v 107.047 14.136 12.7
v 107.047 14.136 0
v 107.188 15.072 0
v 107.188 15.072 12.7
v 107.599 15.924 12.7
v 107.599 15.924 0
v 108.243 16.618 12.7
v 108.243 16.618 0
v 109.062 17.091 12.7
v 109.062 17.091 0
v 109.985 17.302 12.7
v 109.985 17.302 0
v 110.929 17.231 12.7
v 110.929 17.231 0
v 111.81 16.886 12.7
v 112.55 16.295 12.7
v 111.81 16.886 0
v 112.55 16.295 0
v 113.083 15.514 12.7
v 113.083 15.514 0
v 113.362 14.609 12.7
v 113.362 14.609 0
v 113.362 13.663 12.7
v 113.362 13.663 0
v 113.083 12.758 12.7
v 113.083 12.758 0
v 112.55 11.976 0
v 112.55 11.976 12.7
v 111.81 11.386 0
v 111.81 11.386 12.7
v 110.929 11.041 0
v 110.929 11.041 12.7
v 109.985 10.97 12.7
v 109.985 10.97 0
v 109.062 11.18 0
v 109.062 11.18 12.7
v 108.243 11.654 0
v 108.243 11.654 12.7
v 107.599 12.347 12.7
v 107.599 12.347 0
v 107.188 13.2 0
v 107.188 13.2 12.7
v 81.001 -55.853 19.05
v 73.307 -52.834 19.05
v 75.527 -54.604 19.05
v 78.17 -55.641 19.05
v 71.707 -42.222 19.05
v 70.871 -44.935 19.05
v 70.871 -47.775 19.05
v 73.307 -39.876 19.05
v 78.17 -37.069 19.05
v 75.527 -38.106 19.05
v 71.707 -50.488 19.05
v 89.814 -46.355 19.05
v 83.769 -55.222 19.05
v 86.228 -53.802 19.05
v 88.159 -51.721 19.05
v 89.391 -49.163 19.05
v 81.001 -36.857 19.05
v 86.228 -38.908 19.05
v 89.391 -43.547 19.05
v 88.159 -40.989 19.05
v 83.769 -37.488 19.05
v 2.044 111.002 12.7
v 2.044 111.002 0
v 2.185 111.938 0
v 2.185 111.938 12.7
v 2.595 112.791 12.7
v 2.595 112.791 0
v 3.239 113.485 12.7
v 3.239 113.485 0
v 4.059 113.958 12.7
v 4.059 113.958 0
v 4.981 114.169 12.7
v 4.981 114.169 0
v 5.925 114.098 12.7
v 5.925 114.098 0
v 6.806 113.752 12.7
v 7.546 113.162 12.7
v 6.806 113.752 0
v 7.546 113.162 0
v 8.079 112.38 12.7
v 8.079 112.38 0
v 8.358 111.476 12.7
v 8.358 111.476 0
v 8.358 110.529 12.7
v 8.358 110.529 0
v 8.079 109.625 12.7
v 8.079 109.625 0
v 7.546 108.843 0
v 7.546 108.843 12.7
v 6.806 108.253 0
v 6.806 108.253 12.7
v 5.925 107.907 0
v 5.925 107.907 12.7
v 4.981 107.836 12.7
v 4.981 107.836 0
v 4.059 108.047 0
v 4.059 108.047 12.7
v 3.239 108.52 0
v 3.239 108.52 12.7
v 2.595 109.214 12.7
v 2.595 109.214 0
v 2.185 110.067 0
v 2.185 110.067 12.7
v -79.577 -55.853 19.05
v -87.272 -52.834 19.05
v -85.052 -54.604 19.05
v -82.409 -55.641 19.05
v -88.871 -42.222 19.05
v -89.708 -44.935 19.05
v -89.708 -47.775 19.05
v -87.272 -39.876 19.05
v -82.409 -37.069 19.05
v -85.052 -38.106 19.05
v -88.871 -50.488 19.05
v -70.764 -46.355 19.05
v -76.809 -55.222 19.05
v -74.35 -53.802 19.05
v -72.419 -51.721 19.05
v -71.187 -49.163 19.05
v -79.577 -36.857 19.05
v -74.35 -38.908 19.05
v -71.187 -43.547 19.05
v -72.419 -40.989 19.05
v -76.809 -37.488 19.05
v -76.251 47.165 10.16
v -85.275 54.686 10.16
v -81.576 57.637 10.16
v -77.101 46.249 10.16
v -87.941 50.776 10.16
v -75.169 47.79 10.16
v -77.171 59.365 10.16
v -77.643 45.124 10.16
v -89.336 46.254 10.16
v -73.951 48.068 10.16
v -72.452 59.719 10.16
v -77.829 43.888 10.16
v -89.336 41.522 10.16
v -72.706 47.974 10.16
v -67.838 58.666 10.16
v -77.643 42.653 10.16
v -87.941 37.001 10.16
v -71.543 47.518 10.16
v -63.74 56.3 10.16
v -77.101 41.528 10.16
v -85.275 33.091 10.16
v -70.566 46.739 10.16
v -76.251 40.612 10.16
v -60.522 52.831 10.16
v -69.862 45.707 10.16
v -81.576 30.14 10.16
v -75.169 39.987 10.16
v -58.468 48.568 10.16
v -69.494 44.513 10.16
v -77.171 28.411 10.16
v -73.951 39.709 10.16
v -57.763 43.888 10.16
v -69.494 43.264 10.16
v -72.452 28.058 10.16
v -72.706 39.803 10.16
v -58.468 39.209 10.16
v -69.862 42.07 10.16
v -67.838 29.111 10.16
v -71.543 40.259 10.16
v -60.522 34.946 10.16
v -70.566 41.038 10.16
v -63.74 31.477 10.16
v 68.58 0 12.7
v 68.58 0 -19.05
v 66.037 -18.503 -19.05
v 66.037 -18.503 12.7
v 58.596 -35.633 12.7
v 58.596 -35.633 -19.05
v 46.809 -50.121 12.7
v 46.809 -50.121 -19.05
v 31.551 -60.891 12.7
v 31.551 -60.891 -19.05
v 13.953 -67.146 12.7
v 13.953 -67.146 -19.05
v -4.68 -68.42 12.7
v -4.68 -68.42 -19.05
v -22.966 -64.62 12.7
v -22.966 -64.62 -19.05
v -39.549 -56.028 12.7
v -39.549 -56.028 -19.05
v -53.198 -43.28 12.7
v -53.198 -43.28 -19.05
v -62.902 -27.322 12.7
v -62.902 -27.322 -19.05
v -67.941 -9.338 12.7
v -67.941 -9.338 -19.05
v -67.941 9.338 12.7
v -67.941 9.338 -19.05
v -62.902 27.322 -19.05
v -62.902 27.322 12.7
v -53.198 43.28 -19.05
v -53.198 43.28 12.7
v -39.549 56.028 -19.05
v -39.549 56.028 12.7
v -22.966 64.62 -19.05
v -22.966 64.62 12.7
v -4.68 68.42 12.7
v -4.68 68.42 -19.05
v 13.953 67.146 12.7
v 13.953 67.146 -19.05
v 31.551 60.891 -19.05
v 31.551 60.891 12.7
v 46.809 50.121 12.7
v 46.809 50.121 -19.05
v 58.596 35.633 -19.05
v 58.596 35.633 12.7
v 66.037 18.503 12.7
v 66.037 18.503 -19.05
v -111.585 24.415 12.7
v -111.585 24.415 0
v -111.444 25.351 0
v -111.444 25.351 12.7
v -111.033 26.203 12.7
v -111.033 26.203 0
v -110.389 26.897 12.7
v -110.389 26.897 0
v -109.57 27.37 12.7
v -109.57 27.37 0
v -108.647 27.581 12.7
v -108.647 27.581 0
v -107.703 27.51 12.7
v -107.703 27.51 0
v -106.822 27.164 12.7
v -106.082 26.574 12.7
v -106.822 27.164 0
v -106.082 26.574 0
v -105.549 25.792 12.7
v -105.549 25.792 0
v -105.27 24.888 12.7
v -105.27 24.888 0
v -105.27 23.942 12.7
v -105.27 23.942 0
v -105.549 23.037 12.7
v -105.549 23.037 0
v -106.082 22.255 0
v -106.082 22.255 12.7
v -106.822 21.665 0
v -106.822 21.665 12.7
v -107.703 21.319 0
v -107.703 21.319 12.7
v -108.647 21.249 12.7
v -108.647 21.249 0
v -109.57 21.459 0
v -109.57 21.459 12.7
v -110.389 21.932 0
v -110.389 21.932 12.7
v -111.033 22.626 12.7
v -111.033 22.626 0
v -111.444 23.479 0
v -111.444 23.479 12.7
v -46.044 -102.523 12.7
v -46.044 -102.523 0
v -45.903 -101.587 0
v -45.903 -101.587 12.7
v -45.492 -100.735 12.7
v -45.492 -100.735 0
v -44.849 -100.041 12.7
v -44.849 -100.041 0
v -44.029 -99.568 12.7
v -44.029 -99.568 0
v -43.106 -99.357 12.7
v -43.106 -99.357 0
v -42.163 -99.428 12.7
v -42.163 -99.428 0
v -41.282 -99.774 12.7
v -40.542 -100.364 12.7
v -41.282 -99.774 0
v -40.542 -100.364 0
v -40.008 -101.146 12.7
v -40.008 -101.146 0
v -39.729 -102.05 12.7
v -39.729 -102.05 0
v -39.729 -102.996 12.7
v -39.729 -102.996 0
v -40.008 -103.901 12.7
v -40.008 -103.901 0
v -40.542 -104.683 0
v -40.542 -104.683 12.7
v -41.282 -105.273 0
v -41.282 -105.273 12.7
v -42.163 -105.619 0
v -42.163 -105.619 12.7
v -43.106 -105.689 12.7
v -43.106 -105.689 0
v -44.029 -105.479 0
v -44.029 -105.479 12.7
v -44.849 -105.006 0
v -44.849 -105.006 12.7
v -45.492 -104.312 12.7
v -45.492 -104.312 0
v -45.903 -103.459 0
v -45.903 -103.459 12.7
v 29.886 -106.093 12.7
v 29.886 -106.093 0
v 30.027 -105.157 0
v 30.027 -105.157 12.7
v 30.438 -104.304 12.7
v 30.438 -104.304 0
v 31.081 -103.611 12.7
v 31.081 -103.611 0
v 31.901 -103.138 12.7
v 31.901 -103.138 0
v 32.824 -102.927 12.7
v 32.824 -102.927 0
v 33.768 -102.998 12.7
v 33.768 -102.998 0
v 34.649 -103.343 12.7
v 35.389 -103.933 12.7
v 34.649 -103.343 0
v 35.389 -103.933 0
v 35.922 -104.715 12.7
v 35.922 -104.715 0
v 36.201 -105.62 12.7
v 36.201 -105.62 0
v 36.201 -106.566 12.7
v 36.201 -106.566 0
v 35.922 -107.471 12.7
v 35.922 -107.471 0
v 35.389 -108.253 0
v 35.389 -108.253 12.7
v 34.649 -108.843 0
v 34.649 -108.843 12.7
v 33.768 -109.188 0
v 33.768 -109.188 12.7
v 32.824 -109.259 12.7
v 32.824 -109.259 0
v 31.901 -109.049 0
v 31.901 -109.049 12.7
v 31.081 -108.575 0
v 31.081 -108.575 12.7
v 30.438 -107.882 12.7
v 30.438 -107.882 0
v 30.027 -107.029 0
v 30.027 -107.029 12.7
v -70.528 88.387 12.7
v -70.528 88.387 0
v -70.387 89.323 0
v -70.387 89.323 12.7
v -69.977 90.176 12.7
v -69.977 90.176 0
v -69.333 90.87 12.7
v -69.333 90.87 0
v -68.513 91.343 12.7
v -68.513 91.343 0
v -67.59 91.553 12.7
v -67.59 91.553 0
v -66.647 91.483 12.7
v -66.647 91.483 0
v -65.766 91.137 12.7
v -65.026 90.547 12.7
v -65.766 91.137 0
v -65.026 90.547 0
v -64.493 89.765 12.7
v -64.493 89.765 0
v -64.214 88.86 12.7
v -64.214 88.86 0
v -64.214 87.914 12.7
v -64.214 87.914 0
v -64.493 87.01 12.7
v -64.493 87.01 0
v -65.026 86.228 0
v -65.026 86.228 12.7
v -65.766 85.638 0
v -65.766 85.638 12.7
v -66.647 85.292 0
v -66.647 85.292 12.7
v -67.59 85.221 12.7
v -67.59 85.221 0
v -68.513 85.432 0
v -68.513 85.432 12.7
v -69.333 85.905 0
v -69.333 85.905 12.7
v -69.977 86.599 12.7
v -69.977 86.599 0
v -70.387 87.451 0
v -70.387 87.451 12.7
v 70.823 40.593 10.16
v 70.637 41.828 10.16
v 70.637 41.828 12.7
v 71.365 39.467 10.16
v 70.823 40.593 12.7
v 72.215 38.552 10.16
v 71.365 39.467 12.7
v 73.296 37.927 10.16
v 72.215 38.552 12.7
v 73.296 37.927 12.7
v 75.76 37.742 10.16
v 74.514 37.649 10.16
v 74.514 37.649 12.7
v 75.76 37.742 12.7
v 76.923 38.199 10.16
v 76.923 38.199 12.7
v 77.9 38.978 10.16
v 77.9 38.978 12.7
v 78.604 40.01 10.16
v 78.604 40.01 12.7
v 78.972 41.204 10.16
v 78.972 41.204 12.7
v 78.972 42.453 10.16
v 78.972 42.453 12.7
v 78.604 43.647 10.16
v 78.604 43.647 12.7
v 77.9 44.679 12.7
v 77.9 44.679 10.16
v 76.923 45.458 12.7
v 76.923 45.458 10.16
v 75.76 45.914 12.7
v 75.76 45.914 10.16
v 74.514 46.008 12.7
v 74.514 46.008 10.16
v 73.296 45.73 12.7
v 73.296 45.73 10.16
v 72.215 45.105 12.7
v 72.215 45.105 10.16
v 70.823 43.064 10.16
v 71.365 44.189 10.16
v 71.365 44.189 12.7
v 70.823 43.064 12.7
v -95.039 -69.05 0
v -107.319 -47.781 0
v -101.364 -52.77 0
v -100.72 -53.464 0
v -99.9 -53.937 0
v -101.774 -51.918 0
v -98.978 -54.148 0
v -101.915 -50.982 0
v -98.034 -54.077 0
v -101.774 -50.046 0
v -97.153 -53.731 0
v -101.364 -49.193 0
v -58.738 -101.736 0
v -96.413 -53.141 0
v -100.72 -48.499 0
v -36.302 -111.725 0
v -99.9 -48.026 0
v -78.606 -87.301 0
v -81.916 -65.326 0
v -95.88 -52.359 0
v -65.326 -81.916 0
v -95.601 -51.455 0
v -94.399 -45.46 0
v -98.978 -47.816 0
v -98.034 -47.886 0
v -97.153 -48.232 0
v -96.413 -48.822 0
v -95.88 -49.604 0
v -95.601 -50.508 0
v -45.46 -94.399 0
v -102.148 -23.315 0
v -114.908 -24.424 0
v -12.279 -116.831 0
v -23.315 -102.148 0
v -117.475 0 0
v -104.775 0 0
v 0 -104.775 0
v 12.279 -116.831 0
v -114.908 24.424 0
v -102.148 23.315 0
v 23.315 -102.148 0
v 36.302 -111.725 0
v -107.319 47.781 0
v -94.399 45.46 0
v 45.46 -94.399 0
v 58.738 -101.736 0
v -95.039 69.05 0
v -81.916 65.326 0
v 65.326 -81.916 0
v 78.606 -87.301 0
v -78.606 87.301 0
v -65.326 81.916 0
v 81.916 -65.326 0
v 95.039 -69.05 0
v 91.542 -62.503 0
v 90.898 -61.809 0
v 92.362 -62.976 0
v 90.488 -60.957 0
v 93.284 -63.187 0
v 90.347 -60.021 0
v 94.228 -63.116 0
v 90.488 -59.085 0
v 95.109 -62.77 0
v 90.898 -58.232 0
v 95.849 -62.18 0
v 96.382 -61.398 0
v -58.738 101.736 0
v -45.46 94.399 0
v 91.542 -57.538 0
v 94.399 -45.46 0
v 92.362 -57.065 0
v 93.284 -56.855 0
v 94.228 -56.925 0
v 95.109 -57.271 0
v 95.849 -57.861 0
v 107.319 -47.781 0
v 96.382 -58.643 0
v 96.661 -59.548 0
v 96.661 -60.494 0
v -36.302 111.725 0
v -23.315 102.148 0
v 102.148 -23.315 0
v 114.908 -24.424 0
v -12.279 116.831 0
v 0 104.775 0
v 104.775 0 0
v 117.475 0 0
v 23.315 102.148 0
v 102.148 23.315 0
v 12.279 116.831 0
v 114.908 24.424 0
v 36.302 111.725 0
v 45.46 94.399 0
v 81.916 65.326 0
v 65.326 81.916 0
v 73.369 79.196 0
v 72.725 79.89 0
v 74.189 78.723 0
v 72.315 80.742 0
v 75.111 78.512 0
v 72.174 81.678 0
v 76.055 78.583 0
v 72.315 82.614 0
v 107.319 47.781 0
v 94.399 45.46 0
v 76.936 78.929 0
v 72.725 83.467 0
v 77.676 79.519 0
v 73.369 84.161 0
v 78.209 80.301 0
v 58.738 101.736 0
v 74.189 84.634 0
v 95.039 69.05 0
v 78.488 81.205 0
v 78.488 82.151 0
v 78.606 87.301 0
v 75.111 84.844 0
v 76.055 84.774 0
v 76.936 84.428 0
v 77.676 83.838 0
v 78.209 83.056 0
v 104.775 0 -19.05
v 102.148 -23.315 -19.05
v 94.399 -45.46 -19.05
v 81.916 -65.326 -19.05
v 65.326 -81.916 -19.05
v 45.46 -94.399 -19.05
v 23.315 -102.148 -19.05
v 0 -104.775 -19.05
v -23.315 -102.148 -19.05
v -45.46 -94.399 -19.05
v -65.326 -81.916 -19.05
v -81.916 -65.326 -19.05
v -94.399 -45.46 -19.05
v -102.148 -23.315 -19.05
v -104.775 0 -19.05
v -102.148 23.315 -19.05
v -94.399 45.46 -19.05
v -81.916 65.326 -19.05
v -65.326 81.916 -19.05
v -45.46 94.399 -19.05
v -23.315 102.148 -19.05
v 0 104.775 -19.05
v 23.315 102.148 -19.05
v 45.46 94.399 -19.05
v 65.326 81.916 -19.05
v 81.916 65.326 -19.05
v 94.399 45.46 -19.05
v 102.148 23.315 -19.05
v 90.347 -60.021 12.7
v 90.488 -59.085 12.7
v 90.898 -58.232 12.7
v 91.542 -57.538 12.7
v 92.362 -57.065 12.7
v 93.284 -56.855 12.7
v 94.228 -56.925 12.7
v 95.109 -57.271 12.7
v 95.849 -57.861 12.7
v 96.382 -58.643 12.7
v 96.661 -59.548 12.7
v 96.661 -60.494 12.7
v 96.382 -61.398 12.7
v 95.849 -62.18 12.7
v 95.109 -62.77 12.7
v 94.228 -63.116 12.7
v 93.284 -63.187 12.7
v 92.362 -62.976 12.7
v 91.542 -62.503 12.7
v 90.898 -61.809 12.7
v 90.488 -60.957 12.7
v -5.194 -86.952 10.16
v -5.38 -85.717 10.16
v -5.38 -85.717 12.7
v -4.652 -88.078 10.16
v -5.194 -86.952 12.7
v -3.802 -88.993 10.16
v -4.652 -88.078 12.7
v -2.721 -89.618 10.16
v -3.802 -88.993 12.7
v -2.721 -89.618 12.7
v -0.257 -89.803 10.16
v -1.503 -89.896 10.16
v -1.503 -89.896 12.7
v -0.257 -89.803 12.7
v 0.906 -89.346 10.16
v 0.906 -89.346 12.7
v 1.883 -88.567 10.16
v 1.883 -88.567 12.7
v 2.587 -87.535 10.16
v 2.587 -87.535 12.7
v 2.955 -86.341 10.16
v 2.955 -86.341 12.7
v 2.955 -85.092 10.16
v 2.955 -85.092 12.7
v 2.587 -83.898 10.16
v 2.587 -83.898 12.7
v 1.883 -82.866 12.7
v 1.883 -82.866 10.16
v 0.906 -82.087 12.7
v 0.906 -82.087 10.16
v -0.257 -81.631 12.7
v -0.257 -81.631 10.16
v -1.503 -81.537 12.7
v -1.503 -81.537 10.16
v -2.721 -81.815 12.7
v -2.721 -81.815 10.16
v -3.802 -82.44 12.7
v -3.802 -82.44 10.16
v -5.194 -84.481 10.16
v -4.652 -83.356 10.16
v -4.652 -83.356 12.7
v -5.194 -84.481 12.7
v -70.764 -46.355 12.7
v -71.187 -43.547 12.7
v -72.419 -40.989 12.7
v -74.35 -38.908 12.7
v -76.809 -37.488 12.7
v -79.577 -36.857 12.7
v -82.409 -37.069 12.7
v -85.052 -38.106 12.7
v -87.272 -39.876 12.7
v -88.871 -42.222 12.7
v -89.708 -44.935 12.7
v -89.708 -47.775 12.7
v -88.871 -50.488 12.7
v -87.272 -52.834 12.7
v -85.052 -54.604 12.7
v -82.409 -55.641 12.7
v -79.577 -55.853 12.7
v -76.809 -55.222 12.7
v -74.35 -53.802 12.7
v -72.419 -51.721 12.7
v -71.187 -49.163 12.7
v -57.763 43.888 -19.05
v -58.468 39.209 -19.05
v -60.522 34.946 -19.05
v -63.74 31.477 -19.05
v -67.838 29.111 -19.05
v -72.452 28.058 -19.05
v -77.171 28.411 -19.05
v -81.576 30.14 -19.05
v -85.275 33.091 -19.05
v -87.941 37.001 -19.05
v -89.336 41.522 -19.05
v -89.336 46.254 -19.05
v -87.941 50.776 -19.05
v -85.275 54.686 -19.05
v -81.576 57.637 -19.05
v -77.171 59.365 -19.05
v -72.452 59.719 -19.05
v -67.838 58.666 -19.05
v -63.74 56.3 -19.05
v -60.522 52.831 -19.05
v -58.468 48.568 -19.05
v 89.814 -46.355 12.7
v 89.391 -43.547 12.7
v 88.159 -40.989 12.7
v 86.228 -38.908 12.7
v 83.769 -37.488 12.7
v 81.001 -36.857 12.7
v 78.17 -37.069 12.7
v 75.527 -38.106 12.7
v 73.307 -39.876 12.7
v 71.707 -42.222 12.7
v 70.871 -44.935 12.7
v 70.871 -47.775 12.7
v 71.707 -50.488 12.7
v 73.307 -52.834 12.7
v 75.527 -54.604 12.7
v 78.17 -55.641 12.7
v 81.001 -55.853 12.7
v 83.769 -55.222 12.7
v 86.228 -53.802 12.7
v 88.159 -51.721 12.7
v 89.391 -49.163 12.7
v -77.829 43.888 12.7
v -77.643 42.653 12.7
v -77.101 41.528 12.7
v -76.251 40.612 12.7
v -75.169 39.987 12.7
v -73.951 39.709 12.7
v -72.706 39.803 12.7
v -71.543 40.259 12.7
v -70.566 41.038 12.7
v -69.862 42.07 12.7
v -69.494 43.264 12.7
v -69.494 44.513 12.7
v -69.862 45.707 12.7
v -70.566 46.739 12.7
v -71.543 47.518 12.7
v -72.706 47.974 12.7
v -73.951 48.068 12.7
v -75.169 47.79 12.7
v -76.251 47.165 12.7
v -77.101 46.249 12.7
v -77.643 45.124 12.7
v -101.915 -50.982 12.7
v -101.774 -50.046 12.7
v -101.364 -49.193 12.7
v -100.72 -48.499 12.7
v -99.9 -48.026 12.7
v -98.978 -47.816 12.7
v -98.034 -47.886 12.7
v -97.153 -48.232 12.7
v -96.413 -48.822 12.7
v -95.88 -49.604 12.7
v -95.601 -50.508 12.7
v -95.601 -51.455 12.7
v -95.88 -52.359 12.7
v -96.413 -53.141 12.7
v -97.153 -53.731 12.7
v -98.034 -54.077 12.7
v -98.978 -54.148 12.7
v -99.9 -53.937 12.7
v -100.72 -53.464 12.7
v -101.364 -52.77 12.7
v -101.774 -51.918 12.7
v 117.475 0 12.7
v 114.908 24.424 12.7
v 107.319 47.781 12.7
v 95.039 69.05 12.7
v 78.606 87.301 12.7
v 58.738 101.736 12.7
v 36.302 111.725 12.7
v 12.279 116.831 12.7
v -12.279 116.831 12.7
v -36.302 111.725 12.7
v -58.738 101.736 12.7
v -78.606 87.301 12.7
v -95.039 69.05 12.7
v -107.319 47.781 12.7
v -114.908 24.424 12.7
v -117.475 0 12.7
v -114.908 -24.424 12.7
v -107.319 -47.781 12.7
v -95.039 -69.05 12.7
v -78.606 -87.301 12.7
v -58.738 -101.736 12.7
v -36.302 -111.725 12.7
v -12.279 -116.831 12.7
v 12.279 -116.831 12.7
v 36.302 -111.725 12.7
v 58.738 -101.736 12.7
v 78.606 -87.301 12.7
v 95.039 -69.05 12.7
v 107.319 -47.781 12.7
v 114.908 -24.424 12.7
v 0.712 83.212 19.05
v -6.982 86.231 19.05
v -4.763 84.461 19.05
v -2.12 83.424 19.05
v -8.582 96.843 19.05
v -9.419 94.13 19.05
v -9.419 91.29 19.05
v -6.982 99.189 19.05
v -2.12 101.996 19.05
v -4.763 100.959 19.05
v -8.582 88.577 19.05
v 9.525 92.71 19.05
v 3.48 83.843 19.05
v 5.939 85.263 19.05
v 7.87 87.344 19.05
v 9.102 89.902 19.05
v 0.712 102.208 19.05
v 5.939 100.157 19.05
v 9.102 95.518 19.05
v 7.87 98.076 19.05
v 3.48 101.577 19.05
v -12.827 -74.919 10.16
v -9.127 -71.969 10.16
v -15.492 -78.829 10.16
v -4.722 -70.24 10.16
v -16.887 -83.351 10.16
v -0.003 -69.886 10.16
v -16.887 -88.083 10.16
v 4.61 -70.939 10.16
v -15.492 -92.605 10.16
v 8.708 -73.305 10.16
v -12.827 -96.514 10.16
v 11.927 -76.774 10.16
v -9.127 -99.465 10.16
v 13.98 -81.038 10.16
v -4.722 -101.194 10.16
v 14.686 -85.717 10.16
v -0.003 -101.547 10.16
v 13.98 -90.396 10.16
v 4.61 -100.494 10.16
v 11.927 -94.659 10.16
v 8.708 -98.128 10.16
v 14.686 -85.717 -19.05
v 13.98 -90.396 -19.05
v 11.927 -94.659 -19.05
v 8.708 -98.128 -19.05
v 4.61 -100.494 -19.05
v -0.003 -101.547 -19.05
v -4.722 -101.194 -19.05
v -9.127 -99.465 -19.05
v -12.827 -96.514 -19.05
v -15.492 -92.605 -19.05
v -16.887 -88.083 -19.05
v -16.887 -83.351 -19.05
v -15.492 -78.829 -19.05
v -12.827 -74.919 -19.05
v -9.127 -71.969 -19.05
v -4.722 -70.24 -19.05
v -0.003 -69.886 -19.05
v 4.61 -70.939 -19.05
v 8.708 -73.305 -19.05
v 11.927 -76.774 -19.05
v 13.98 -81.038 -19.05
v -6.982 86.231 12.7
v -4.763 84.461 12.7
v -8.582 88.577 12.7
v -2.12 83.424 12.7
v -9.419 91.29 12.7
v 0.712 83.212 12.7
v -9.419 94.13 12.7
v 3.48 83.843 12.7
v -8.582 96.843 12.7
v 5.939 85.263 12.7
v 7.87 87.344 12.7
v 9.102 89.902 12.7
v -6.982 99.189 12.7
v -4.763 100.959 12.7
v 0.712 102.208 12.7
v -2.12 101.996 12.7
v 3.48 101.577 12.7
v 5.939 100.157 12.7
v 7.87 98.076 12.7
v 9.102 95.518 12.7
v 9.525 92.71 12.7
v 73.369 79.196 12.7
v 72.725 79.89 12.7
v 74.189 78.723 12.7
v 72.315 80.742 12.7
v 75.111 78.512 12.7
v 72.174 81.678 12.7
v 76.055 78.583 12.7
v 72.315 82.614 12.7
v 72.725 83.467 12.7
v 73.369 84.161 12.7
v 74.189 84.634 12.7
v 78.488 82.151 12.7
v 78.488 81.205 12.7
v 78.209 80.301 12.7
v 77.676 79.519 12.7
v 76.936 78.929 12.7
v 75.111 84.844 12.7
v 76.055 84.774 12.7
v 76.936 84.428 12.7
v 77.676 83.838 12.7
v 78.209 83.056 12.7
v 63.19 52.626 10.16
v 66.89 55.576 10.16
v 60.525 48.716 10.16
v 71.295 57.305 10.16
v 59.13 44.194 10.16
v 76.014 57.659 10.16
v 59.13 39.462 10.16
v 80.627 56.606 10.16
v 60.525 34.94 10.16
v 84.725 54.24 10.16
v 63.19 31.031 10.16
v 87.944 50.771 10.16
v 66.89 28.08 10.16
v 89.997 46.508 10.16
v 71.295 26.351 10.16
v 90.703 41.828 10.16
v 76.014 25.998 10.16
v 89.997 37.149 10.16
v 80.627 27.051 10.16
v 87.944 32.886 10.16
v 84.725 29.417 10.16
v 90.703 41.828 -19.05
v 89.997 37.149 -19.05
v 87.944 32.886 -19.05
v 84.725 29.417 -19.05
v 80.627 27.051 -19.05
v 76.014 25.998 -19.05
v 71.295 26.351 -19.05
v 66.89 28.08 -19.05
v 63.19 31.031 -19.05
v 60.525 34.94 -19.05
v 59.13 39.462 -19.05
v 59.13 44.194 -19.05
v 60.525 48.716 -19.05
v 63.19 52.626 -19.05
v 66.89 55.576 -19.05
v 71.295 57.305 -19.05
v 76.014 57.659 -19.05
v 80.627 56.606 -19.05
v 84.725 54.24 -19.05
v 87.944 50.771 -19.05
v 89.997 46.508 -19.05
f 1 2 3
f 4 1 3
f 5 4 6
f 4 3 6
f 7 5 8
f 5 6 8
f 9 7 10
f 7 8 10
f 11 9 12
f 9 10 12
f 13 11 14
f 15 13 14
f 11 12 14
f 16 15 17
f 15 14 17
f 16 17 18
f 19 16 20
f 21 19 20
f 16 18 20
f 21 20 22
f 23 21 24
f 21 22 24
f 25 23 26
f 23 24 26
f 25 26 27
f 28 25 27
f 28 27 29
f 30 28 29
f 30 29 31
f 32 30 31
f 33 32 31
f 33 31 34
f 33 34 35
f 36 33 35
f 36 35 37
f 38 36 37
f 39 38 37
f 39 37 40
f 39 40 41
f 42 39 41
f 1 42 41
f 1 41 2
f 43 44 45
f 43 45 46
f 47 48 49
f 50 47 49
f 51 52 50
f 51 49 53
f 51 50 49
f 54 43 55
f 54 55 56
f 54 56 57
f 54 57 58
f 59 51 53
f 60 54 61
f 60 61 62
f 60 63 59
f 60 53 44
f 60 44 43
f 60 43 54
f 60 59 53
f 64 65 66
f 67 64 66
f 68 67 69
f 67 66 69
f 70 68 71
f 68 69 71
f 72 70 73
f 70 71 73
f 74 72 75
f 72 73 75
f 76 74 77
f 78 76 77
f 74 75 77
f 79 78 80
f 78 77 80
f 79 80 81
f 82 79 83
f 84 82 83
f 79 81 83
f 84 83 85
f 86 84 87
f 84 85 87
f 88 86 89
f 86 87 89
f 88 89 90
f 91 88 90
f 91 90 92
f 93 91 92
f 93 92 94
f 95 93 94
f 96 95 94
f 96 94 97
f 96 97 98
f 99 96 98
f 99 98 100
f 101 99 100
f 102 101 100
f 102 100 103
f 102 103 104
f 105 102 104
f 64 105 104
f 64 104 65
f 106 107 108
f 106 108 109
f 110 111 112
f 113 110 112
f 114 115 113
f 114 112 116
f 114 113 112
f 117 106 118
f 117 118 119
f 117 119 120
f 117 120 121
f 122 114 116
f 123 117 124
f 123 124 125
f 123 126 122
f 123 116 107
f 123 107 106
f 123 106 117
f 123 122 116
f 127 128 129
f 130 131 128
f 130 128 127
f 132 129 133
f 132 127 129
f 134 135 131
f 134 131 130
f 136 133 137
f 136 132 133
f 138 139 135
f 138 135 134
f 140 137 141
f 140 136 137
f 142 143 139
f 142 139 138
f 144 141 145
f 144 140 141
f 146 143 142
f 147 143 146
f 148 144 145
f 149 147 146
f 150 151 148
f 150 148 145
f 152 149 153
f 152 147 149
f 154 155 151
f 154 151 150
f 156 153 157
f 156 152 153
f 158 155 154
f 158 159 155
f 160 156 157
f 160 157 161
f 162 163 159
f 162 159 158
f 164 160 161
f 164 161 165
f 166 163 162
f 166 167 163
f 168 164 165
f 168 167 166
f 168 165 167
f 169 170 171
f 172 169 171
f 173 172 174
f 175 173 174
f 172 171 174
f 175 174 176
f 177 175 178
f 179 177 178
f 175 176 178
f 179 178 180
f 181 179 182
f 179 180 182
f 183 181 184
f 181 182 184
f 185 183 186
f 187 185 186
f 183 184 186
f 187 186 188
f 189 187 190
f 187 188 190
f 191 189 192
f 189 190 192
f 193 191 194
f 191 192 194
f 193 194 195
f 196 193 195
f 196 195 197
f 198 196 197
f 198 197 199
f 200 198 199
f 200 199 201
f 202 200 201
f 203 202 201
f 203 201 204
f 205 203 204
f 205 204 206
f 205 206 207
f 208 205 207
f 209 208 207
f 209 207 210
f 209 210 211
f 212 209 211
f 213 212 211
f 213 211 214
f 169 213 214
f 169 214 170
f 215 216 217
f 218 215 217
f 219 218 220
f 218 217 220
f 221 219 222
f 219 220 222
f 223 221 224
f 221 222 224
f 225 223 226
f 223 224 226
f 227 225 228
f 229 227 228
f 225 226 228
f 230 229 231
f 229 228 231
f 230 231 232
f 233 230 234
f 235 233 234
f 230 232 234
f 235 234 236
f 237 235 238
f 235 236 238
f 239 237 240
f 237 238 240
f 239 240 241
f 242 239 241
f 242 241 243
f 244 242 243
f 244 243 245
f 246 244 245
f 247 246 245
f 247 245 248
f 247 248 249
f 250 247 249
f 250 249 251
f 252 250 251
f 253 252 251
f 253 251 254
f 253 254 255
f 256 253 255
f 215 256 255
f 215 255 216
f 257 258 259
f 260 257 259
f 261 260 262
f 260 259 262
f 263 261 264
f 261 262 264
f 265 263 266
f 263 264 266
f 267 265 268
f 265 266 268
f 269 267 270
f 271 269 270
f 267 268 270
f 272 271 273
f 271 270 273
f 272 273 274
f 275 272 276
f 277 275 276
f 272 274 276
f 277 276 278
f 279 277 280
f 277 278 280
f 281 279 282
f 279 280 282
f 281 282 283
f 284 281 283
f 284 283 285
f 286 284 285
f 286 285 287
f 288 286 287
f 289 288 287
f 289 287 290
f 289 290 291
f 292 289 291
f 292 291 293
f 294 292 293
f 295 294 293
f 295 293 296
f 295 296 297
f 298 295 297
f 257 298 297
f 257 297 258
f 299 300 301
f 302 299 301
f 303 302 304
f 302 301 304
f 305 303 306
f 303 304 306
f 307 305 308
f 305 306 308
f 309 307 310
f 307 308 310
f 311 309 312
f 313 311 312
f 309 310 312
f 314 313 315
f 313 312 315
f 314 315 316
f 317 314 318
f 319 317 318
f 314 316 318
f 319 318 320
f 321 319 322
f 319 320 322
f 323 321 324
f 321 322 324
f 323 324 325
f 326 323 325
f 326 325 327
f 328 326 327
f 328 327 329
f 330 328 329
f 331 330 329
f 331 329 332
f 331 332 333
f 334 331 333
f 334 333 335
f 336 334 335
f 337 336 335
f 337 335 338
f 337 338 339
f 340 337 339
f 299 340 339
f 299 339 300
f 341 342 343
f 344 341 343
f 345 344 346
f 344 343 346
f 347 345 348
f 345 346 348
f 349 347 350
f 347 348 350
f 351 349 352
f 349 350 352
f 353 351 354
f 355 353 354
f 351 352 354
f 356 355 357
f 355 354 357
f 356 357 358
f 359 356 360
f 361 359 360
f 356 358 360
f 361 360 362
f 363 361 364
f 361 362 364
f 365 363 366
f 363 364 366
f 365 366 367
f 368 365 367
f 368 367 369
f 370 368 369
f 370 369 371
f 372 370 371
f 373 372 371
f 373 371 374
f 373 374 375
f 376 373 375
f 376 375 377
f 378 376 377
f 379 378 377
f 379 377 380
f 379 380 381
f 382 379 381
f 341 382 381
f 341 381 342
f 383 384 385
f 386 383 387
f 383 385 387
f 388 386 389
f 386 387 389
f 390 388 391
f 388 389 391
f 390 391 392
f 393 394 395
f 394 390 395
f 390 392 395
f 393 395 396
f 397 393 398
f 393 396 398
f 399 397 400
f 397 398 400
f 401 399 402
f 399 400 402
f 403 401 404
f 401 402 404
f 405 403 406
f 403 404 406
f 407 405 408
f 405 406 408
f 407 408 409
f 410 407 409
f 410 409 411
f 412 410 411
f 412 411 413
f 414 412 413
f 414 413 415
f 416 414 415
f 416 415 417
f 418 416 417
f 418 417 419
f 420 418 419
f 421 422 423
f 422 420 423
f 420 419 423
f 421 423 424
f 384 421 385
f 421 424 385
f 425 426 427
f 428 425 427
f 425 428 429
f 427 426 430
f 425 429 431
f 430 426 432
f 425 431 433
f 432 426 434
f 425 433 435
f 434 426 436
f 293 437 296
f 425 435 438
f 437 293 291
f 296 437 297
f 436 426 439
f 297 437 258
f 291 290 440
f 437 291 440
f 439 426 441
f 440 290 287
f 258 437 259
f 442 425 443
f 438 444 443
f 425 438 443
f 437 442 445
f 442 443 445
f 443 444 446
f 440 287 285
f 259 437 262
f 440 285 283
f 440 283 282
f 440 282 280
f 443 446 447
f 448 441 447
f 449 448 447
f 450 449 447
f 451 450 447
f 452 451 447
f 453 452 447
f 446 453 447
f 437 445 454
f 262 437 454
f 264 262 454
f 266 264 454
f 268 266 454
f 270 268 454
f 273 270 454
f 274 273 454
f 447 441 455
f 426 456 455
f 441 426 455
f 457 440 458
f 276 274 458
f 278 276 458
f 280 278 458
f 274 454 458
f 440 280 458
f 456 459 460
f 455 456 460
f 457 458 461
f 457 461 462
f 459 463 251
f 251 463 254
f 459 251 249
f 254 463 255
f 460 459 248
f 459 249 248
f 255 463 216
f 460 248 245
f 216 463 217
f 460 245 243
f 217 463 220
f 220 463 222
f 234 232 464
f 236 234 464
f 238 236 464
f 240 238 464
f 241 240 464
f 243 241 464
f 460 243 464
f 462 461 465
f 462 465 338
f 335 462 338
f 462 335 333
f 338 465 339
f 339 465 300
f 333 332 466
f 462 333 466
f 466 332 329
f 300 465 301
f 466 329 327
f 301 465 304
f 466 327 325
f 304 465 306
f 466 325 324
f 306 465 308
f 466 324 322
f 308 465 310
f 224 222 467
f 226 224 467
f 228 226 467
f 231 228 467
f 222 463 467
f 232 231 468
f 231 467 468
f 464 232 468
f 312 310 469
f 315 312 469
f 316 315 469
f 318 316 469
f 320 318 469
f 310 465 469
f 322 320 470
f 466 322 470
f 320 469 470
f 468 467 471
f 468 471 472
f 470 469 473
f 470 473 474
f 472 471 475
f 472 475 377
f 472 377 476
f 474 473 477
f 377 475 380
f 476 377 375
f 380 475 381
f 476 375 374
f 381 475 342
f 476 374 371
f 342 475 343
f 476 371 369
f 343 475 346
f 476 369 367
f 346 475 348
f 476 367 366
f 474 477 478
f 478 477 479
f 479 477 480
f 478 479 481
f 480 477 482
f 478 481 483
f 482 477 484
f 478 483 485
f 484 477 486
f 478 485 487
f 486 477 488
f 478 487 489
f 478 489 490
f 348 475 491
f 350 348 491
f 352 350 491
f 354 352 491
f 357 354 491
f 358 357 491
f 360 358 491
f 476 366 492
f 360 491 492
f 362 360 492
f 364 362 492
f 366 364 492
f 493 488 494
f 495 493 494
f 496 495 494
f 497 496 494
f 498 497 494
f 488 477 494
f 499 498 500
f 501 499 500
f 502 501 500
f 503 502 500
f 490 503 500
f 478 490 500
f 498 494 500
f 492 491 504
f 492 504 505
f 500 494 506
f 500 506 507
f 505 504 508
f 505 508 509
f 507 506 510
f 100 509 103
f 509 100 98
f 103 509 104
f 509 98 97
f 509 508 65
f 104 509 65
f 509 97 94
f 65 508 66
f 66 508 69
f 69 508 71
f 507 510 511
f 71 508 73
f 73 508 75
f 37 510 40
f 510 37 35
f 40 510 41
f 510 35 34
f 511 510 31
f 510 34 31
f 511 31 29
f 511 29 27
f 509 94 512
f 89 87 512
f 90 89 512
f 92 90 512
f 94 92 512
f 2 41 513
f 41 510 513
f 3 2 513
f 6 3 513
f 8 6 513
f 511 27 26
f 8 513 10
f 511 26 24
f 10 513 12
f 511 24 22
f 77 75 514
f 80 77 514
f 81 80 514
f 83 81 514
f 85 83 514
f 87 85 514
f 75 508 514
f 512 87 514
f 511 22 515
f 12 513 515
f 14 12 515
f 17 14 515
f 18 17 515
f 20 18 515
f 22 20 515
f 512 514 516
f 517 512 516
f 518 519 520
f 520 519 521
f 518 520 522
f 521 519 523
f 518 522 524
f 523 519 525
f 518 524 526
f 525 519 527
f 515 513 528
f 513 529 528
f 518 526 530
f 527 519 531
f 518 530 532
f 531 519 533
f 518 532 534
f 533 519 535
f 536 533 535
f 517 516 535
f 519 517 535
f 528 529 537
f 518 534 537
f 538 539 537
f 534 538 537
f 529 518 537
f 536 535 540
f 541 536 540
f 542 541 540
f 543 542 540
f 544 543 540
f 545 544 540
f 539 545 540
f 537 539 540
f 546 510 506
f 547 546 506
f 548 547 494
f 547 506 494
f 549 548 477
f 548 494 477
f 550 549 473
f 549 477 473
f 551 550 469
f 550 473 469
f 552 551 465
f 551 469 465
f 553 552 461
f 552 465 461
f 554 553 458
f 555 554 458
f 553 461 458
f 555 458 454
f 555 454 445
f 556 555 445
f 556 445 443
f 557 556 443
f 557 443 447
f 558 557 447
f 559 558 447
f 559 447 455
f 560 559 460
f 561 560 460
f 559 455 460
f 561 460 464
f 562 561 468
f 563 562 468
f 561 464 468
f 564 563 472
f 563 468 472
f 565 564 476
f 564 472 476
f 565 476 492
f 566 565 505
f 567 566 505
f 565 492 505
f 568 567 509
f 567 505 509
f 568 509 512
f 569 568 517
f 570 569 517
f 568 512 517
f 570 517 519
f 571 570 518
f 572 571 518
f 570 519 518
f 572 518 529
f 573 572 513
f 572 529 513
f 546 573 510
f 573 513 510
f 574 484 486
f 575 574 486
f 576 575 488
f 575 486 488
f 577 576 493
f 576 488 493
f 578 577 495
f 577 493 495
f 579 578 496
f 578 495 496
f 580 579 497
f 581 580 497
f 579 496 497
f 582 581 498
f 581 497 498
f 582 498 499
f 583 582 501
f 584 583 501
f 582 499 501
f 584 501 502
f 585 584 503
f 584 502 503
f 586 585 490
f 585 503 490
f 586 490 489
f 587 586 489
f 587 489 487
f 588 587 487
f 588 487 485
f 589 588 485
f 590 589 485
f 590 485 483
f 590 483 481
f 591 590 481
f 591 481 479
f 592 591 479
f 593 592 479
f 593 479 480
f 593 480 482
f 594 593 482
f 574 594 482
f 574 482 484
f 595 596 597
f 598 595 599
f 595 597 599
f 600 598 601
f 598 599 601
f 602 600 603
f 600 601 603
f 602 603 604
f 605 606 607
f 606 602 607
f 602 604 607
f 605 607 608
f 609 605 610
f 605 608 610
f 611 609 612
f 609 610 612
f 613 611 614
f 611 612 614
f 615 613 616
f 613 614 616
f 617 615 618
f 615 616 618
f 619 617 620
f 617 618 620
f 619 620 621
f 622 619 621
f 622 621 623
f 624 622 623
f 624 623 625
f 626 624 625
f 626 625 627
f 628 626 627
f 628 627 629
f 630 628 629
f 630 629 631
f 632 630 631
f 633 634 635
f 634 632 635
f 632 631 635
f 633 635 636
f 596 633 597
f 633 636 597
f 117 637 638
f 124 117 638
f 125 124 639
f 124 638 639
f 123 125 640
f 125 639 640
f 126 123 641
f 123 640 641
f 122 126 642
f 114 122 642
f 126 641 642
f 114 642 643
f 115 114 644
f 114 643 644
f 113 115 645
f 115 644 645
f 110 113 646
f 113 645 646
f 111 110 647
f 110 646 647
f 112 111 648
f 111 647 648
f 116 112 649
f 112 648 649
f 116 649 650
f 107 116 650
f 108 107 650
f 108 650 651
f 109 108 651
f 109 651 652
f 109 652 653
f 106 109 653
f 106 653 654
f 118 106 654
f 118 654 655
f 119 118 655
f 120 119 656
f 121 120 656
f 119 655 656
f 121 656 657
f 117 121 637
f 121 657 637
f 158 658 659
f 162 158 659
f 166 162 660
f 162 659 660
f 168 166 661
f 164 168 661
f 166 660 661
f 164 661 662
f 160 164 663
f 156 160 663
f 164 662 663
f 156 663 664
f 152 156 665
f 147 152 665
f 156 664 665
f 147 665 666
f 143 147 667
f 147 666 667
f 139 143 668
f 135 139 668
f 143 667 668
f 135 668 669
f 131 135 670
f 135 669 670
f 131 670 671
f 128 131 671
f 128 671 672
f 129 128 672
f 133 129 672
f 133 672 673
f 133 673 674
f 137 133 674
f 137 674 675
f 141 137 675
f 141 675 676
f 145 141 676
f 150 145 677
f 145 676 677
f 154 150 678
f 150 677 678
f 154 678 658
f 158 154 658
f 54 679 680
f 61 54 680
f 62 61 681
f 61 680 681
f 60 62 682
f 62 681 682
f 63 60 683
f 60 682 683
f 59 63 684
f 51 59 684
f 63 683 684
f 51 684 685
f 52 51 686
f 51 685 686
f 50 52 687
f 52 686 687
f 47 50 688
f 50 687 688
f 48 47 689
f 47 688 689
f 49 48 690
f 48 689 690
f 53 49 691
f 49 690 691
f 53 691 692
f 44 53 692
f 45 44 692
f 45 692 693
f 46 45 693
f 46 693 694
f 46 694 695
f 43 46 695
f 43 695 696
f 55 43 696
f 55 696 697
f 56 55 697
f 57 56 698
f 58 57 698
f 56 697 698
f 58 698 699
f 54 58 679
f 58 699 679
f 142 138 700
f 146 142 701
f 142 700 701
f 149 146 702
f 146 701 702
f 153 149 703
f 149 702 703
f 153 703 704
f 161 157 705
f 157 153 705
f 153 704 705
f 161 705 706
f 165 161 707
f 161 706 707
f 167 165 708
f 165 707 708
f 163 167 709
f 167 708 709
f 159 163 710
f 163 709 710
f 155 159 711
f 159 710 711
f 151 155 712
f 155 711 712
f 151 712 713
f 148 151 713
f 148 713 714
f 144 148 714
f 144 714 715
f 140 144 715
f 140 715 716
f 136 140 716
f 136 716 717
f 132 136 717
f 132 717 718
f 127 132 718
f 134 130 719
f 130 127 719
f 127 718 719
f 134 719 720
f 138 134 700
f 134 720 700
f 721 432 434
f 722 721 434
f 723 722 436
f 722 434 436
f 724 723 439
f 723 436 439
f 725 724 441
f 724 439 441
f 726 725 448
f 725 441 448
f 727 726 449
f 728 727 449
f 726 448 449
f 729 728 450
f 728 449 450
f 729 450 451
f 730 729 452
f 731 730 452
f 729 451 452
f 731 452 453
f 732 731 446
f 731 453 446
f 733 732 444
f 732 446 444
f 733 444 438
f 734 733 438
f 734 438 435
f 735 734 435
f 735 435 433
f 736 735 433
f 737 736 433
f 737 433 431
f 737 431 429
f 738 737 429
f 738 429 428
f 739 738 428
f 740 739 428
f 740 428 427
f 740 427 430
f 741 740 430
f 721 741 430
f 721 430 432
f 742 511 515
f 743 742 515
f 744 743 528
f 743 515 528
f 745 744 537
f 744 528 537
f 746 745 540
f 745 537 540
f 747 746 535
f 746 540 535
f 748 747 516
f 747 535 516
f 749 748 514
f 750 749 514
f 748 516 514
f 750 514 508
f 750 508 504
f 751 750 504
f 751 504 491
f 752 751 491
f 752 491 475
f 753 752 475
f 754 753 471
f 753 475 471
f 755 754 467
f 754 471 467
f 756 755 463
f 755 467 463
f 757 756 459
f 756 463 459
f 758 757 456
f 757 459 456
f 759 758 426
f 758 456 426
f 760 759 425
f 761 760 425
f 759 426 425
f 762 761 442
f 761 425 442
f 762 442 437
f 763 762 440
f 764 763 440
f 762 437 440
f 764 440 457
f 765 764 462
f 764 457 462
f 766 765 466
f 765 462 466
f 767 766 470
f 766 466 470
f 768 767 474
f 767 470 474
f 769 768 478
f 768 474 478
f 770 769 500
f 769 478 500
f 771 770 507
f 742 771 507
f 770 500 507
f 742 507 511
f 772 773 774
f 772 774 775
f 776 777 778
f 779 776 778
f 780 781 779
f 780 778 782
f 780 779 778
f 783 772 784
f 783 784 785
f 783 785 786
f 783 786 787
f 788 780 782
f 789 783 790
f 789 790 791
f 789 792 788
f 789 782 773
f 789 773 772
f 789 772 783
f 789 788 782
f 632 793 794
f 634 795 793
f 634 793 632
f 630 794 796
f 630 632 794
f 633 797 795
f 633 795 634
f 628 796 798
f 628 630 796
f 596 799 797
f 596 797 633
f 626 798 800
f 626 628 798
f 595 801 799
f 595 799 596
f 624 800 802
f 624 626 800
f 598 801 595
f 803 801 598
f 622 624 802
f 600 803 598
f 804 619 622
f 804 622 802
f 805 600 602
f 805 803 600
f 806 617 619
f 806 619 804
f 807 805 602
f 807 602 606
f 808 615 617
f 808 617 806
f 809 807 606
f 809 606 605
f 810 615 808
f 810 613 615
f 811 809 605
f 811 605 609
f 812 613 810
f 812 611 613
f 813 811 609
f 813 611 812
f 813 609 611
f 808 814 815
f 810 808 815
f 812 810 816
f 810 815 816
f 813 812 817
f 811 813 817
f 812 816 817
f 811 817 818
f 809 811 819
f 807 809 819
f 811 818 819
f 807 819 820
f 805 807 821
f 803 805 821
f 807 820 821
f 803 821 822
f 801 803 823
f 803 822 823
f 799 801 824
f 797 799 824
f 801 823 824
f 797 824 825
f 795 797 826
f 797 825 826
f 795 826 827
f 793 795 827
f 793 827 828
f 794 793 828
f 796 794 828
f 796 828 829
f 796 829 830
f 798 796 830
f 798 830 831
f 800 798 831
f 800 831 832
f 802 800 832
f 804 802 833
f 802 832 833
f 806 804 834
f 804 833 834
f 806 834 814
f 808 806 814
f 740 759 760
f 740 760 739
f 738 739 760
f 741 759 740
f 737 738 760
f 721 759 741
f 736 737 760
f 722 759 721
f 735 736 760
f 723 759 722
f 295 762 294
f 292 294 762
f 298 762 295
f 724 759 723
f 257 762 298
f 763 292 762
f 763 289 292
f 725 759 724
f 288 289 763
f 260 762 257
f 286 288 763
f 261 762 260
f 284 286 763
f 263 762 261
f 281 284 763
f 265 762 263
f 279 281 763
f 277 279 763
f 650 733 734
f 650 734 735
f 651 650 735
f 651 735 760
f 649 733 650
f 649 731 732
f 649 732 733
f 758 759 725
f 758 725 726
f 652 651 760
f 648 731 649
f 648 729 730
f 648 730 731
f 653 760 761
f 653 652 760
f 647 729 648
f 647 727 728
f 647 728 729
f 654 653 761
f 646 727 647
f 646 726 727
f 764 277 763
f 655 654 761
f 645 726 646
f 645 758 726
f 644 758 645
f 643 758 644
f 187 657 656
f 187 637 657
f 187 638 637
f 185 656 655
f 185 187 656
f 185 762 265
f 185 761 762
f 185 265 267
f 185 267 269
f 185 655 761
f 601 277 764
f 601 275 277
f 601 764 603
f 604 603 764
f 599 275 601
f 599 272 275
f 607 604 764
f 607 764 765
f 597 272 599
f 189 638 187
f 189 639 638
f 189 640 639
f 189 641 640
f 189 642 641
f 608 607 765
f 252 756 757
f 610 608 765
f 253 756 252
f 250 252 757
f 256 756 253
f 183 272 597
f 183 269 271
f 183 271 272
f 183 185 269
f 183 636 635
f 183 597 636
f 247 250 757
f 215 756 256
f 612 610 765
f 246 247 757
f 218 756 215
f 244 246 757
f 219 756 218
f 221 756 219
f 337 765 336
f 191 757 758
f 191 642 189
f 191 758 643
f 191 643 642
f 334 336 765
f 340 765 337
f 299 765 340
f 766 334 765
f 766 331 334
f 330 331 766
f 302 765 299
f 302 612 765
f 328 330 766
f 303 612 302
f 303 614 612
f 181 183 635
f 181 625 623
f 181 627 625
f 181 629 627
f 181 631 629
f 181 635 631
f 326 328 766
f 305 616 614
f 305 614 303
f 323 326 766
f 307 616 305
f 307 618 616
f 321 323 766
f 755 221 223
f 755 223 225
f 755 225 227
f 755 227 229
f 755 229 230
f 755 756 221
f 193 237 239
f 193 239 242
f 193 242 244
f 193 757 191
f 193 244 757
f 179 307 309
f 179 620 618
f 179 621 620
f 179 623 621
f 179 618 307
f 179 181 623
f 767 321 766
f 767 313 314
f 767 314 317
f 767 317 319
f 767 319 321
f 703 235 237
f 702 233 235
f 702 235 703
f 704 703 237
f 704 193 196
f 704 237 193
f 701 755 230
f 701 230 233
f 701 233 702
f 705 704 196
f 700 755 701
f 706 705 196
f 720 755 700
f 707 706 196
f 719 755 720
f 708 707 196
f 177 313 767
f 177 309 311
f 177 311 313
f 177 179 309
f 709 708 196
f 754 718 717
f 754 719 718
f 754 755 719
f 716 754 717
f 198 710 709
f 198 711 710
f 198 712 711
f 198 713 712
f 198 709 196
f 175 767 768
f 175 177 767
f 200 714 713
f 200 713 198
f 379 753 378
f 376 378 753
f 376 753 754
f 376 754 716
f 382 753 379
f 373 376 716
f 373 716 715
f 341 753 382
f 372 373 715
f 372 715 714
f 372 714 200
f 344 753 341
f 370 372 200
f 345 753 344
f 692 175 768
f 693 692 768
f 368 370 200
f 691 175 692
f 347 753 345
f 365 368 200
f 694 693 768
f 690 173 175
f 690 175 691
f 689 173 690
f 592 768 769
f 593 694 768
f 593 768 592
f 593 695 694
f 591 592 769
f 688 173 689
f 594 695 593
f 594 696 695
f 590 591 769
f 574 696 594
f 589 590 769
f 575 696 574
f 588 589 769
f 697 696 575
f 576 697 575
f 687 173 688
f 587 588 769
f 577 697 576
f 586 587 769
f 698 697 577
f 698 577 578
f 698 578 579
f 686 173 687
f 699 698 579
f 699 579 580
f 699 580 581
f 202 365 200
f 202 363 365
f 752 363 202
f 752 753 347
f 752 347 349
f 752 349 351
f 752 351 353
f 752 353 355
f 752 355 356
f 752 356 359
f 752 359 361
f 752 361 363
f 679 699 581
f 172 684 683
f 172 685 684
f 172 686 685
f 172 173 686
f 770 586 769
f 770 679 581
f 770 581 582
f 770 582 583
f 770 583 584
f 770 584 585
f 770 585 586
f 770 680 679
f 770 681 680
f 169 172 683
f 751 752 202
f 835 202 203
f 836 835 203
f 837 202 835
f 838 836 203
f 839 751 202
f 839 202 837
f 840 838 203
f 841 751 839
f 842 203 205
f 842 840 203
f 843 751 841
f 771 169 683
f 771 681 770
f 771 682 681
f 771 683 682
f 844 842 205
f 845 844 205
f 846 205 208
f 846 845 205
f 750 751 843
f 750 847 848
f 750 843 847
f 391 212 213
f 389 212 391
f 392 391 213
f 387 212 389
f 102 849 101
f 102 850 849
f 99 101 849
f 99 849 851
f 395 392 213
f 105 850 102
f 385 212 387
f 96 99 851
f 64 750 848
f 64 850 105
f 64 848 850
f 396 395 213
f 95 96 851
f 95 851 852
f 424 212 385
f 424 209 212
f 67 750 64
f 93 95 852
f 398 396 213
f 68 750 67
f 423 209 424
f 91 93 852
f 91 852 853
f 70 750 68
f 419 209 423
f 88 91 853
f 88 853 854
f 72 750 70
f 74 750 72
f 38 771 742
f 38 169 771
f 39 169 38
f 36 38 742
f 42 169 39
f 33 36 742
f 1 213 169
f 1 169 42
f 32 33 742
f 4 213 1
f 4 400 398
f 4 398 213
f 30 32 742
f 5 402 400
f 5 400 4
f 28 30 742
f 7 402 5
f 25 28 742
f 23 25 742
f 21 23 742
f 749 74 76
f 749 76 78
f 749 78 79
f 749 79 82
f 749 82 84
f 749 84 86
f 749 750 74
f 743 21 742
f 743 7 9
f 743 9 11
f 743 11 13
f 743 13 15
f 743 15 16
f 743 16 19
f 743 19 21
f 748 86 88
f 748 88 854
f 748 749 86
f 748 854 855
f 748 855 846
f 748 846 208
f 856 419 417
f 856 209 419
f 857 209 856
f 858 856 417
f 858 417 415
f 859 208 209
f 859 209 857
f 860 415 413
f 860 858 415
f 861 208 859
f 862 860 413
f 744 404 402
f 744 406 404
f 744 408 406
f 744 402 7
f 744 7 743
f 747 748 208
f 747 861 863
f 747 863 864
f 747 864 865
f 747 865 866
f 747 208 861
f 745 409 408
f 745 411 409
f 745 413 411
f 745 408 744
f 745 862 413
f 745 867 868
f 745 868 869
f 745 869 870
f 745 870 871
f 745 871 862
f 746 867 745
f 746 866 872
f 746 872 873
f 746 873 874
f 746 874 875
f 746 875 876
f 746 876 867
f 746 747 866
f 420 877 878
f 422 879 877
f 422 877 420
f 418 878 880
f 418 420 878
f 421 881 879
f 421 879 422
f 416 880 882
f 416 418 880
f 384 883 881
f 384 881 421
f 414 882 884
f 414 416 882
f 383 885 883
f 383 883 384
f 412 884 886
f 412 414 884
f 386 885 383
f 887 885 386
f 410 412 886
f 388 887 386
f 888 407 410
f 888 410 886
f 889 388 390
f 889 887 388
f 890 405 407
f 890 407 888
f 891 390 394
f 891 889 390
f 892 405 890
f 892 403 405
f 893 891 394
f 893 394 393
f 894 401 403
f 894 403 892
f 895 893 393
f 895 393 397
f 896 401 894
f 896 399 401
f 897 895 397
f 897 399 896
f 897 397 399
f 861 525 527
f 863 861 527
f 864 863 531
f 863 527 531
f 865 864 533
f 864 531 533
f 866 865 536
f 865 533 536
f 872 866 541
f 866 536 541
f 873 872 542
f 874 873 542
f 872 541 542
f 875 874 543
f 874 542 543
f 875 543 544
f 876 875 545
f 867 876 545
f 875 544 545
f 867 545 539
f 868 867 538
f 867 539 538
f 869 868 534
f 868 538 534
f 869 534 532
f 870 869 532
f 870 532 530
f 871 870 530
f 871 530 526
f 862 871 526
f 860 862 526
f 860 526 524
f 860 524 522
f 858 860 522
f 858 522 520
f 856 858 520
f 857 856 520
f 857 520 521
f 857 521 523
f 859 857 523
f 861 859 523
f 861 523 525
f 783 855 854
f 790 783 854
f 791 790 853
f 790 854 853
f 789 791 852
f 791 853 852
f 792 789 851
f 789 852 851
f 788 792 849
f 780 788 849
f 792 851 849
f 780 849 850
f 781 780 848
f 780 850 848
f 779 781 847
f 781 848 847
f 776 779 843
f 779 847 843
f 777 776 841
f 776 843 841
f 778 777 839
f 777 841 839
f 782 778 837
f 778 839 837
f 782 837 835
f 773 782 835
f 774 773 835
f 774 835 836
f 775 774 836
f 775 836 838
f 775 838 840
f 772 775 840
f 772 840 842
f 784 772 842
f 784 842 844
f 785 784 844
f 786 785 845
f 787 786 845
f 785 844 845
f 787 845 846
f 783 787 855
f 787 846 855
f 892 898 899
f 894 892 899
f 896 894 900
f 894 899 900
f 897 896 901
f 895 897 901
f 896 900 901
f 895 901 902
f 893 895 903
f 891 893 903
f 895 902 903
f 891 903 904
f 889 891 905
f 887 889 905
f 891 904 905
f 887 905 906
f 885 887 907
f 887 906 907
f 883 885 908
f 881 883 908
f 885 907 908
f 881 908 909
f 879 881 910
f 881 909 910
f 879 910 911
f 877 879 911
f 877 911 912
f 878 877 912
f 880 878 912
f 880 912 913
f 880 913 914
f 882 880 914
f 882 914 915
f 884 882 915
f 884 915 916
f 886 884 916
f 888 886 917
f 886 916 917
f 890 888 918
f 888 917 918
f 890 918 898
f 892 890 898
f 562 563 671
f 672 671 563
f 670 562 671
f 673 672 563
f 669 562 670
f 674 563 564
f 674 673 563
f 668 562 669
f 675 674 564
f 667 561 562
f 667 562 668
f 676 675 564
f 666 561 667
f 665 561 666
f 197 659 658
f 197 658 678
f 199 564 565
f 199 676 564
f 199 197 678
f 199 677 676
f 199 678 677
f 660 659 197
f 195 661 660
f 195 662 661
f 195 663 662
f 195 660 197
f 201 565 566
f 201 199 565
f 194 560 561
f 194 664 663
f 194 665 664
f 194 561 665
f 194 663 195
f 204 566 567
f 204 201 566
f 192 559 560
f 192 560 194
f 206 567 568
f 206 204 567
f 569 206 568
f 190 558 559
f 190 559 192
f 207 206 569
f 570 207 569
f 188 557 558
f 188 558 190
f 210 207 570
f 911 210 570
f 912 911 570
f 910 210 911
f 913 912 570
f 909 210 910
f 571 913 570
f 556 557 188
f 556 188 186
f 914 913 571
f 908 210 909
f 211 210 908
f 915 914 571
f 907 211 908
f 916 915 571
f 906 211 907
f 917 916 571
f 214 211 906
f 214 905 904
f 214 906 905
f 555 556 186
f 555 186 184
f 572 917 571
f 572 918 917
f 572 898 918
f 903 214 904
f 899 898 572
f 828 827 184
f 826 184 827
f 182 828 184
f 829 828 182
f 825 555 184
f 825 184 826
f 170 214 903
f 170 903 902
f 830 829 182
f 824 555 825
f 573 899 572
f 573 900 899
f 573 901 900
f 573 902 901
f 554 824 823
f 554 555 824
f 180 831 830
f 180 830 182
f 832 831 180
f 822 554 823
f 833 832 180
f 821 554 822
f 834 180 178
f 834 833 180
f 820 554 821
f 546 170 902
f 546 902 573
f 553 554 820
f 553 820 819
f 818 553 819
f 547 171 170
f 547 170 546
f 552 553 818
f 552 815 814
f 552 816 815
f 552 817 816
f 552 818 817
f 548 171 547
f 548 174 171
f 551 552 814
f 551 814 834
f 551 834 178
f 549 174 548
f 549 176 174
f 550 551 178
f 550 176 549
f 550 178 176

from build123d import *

# Parameters (mm, degrees)
F0_R      = 117.475
F1_DEPTH  = 12.7
F2_R      = 104.775
F3_DEPTH  = 19.05
F6_D      = 6.35
F8_D      = 8.382
F9_R      = 15.875
F9_R_2    = 4.191
F10_DEPTH = 29.21
F11_R     = 68.58
F12_DEPTH = 31.751
F13_R     = 9.525
F14_DEPTH = 6.35


with BuildPart() as f1:
    # F0 (on Top) → F1 (new body)
    with BuildSketch(Plane.XY):
        Circle(F0_R)
    extrude(amount=F1_DEPTH)

    # F2 (on face) → F3 (join)
    with BuildSketch(Plane(origin=(0, 0, 0), x_dir=(1, 0, 0), z_dir=(0, 0, -1))):
        Circle(F2_R)
    extrude(amount=F3_DEPTH)

    # F6 (through all)
    with Locations(Plane.XY.offset(12.7)):
        with Locations((-108.409797, 24.41478), (-98.740241, -50.981668), (-42.869029, -102.523227), (33.061079, -106.093029), (93.52154, -60.020723), (110.222233, 14.135946), (75.348719, 81.678248), (-67.353204, 88.387281), (5.218701, 111.002391)):
            Hole(F6_D / 2)

    # F8 (through all)
    with Locations(Plane(origin=(0, 0, -19.05), x_dir=(1, 0, 0), z_dir=(0, 0, -1))):
        with Locations((74.827591, -41.828307), (-73.638172, -43.888441), (-1.189419, 85.716748)):
            Hole(F8_D / 2)

    # F9 (on face) → F10 (cut)
    with BuildSketch(Plane(origin=(0, 0, -19.05), x_dir=(1, 0, 0), z_dir=(0, 0, -1))):
        with Locations((-73.638172, -43.888441)):
            Circle(F9_R)
        with Locations((-73.638172, -43.888441)):
            Circle(F9_R_2, mode=Mode.SUBTRACT)
        with Locations((-1.189419, 85.716748)):
            Circle(F9_R)
        with Locations((-1.189419, 85.716748)):
            Circle(F9_R_2, mode=Mode.SUBTRACT)
        with Locations((74.827591, -41.828307)):
            Circle(F9_R)
        with Locations((74.827591, -41.828307)):
            Circle(F9_R_2, mode=Mode.SUBTRACT)
    extrude(amount=-F10_DEPTH, mode=Mode.SUBTRACT)

    # F11 (on face) → F12 (cut, through all)
    with BuildSketch(Plane(origin=(0, 0, -19.05), x_dir=(1, 0, 0), z_dir=(0, 0, -1))):
        Circle(F11_R)
    extrude(amount=-F12_DEPTH, mode=Mode.SUBTRACT)

    # F13 (on face) → F14 (join)
    with BuildSketch(Plane.XY.offset(12.7)):
        with Locations((0, 92.71)):
            Circle(F13_R)
        with Locations((80.289215, -46.355)):
            Circle(F13_R)
        with Locations((-80.289215, -46.355)):
            Circle(F13_R)
    extrude(amount=F14_DEPTH)


solid = f1.part
